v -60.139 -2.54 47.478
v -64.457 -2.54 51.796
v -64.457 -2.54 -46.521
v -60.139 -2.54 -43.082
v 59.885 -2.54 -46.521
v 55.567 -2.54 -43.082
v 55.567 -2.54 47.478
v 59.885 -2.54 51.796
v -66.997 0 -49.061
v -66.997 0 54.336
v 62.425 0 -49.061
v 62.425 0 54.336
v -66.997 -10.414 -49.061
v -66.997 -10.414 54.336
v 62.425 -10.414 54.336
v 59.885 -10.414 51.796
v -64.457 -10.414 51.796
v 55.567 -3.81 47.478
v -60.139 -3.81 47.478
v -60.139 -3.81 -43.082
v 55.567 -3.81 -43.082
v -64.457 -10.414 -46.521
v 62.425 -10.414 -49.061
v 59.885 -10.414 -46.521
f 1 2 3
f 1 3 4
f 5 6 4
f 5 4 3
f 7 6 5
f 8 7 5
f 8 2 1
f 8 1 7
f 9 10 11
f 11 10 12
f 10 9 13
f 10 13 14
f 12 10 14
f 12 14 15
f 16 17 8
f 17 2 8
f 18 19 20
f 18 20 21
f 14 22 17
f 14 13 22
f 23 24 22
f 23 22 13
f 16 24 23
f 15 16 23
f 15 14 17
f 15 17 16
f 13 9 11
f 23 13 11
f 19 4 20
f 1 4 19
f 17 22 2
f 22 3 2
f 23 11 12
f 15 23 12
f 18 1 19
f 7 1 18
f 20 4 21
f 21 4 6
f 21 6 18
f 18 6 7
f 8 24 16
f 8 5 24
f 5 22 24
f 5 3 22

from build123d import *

# Parameters (mm, degrees)
F0_W     = 129.422773
F0_H     = 103.397541
F1_DEPTH = 10.414
F2_T     = -2.54
F3_W     = 115.706771
F3_H     = 90.560776
F4_DEPTH = 1.27


with BuildPart() as f1:
    # F0 (on Front) → F1 (new body)
    with BuildSketch(Plane.XZ):
        with Locations((-2.286001, 2.637691)):
            Rectangle(F0_W, F0_H)
    extrude(amount=F1_DEPTH)

    # F2
    f2_openings = [f1.faces().sort_by_distance(p)[0] for p in [
        (-2.286, -10.414, 2.637692),
    ]]
    offset(amount=F2_T, openings=f2_openings)

    # F3 (on face) → F4 (join)
    with BuildSketch(Plane.XZ.offset(2.54)):
        with Locations((-2.285999, 2.198076)):
            Rectangle(F3_W, F3_H)
    extrude(amount=F4_DEPTH)


solid = f1.part
